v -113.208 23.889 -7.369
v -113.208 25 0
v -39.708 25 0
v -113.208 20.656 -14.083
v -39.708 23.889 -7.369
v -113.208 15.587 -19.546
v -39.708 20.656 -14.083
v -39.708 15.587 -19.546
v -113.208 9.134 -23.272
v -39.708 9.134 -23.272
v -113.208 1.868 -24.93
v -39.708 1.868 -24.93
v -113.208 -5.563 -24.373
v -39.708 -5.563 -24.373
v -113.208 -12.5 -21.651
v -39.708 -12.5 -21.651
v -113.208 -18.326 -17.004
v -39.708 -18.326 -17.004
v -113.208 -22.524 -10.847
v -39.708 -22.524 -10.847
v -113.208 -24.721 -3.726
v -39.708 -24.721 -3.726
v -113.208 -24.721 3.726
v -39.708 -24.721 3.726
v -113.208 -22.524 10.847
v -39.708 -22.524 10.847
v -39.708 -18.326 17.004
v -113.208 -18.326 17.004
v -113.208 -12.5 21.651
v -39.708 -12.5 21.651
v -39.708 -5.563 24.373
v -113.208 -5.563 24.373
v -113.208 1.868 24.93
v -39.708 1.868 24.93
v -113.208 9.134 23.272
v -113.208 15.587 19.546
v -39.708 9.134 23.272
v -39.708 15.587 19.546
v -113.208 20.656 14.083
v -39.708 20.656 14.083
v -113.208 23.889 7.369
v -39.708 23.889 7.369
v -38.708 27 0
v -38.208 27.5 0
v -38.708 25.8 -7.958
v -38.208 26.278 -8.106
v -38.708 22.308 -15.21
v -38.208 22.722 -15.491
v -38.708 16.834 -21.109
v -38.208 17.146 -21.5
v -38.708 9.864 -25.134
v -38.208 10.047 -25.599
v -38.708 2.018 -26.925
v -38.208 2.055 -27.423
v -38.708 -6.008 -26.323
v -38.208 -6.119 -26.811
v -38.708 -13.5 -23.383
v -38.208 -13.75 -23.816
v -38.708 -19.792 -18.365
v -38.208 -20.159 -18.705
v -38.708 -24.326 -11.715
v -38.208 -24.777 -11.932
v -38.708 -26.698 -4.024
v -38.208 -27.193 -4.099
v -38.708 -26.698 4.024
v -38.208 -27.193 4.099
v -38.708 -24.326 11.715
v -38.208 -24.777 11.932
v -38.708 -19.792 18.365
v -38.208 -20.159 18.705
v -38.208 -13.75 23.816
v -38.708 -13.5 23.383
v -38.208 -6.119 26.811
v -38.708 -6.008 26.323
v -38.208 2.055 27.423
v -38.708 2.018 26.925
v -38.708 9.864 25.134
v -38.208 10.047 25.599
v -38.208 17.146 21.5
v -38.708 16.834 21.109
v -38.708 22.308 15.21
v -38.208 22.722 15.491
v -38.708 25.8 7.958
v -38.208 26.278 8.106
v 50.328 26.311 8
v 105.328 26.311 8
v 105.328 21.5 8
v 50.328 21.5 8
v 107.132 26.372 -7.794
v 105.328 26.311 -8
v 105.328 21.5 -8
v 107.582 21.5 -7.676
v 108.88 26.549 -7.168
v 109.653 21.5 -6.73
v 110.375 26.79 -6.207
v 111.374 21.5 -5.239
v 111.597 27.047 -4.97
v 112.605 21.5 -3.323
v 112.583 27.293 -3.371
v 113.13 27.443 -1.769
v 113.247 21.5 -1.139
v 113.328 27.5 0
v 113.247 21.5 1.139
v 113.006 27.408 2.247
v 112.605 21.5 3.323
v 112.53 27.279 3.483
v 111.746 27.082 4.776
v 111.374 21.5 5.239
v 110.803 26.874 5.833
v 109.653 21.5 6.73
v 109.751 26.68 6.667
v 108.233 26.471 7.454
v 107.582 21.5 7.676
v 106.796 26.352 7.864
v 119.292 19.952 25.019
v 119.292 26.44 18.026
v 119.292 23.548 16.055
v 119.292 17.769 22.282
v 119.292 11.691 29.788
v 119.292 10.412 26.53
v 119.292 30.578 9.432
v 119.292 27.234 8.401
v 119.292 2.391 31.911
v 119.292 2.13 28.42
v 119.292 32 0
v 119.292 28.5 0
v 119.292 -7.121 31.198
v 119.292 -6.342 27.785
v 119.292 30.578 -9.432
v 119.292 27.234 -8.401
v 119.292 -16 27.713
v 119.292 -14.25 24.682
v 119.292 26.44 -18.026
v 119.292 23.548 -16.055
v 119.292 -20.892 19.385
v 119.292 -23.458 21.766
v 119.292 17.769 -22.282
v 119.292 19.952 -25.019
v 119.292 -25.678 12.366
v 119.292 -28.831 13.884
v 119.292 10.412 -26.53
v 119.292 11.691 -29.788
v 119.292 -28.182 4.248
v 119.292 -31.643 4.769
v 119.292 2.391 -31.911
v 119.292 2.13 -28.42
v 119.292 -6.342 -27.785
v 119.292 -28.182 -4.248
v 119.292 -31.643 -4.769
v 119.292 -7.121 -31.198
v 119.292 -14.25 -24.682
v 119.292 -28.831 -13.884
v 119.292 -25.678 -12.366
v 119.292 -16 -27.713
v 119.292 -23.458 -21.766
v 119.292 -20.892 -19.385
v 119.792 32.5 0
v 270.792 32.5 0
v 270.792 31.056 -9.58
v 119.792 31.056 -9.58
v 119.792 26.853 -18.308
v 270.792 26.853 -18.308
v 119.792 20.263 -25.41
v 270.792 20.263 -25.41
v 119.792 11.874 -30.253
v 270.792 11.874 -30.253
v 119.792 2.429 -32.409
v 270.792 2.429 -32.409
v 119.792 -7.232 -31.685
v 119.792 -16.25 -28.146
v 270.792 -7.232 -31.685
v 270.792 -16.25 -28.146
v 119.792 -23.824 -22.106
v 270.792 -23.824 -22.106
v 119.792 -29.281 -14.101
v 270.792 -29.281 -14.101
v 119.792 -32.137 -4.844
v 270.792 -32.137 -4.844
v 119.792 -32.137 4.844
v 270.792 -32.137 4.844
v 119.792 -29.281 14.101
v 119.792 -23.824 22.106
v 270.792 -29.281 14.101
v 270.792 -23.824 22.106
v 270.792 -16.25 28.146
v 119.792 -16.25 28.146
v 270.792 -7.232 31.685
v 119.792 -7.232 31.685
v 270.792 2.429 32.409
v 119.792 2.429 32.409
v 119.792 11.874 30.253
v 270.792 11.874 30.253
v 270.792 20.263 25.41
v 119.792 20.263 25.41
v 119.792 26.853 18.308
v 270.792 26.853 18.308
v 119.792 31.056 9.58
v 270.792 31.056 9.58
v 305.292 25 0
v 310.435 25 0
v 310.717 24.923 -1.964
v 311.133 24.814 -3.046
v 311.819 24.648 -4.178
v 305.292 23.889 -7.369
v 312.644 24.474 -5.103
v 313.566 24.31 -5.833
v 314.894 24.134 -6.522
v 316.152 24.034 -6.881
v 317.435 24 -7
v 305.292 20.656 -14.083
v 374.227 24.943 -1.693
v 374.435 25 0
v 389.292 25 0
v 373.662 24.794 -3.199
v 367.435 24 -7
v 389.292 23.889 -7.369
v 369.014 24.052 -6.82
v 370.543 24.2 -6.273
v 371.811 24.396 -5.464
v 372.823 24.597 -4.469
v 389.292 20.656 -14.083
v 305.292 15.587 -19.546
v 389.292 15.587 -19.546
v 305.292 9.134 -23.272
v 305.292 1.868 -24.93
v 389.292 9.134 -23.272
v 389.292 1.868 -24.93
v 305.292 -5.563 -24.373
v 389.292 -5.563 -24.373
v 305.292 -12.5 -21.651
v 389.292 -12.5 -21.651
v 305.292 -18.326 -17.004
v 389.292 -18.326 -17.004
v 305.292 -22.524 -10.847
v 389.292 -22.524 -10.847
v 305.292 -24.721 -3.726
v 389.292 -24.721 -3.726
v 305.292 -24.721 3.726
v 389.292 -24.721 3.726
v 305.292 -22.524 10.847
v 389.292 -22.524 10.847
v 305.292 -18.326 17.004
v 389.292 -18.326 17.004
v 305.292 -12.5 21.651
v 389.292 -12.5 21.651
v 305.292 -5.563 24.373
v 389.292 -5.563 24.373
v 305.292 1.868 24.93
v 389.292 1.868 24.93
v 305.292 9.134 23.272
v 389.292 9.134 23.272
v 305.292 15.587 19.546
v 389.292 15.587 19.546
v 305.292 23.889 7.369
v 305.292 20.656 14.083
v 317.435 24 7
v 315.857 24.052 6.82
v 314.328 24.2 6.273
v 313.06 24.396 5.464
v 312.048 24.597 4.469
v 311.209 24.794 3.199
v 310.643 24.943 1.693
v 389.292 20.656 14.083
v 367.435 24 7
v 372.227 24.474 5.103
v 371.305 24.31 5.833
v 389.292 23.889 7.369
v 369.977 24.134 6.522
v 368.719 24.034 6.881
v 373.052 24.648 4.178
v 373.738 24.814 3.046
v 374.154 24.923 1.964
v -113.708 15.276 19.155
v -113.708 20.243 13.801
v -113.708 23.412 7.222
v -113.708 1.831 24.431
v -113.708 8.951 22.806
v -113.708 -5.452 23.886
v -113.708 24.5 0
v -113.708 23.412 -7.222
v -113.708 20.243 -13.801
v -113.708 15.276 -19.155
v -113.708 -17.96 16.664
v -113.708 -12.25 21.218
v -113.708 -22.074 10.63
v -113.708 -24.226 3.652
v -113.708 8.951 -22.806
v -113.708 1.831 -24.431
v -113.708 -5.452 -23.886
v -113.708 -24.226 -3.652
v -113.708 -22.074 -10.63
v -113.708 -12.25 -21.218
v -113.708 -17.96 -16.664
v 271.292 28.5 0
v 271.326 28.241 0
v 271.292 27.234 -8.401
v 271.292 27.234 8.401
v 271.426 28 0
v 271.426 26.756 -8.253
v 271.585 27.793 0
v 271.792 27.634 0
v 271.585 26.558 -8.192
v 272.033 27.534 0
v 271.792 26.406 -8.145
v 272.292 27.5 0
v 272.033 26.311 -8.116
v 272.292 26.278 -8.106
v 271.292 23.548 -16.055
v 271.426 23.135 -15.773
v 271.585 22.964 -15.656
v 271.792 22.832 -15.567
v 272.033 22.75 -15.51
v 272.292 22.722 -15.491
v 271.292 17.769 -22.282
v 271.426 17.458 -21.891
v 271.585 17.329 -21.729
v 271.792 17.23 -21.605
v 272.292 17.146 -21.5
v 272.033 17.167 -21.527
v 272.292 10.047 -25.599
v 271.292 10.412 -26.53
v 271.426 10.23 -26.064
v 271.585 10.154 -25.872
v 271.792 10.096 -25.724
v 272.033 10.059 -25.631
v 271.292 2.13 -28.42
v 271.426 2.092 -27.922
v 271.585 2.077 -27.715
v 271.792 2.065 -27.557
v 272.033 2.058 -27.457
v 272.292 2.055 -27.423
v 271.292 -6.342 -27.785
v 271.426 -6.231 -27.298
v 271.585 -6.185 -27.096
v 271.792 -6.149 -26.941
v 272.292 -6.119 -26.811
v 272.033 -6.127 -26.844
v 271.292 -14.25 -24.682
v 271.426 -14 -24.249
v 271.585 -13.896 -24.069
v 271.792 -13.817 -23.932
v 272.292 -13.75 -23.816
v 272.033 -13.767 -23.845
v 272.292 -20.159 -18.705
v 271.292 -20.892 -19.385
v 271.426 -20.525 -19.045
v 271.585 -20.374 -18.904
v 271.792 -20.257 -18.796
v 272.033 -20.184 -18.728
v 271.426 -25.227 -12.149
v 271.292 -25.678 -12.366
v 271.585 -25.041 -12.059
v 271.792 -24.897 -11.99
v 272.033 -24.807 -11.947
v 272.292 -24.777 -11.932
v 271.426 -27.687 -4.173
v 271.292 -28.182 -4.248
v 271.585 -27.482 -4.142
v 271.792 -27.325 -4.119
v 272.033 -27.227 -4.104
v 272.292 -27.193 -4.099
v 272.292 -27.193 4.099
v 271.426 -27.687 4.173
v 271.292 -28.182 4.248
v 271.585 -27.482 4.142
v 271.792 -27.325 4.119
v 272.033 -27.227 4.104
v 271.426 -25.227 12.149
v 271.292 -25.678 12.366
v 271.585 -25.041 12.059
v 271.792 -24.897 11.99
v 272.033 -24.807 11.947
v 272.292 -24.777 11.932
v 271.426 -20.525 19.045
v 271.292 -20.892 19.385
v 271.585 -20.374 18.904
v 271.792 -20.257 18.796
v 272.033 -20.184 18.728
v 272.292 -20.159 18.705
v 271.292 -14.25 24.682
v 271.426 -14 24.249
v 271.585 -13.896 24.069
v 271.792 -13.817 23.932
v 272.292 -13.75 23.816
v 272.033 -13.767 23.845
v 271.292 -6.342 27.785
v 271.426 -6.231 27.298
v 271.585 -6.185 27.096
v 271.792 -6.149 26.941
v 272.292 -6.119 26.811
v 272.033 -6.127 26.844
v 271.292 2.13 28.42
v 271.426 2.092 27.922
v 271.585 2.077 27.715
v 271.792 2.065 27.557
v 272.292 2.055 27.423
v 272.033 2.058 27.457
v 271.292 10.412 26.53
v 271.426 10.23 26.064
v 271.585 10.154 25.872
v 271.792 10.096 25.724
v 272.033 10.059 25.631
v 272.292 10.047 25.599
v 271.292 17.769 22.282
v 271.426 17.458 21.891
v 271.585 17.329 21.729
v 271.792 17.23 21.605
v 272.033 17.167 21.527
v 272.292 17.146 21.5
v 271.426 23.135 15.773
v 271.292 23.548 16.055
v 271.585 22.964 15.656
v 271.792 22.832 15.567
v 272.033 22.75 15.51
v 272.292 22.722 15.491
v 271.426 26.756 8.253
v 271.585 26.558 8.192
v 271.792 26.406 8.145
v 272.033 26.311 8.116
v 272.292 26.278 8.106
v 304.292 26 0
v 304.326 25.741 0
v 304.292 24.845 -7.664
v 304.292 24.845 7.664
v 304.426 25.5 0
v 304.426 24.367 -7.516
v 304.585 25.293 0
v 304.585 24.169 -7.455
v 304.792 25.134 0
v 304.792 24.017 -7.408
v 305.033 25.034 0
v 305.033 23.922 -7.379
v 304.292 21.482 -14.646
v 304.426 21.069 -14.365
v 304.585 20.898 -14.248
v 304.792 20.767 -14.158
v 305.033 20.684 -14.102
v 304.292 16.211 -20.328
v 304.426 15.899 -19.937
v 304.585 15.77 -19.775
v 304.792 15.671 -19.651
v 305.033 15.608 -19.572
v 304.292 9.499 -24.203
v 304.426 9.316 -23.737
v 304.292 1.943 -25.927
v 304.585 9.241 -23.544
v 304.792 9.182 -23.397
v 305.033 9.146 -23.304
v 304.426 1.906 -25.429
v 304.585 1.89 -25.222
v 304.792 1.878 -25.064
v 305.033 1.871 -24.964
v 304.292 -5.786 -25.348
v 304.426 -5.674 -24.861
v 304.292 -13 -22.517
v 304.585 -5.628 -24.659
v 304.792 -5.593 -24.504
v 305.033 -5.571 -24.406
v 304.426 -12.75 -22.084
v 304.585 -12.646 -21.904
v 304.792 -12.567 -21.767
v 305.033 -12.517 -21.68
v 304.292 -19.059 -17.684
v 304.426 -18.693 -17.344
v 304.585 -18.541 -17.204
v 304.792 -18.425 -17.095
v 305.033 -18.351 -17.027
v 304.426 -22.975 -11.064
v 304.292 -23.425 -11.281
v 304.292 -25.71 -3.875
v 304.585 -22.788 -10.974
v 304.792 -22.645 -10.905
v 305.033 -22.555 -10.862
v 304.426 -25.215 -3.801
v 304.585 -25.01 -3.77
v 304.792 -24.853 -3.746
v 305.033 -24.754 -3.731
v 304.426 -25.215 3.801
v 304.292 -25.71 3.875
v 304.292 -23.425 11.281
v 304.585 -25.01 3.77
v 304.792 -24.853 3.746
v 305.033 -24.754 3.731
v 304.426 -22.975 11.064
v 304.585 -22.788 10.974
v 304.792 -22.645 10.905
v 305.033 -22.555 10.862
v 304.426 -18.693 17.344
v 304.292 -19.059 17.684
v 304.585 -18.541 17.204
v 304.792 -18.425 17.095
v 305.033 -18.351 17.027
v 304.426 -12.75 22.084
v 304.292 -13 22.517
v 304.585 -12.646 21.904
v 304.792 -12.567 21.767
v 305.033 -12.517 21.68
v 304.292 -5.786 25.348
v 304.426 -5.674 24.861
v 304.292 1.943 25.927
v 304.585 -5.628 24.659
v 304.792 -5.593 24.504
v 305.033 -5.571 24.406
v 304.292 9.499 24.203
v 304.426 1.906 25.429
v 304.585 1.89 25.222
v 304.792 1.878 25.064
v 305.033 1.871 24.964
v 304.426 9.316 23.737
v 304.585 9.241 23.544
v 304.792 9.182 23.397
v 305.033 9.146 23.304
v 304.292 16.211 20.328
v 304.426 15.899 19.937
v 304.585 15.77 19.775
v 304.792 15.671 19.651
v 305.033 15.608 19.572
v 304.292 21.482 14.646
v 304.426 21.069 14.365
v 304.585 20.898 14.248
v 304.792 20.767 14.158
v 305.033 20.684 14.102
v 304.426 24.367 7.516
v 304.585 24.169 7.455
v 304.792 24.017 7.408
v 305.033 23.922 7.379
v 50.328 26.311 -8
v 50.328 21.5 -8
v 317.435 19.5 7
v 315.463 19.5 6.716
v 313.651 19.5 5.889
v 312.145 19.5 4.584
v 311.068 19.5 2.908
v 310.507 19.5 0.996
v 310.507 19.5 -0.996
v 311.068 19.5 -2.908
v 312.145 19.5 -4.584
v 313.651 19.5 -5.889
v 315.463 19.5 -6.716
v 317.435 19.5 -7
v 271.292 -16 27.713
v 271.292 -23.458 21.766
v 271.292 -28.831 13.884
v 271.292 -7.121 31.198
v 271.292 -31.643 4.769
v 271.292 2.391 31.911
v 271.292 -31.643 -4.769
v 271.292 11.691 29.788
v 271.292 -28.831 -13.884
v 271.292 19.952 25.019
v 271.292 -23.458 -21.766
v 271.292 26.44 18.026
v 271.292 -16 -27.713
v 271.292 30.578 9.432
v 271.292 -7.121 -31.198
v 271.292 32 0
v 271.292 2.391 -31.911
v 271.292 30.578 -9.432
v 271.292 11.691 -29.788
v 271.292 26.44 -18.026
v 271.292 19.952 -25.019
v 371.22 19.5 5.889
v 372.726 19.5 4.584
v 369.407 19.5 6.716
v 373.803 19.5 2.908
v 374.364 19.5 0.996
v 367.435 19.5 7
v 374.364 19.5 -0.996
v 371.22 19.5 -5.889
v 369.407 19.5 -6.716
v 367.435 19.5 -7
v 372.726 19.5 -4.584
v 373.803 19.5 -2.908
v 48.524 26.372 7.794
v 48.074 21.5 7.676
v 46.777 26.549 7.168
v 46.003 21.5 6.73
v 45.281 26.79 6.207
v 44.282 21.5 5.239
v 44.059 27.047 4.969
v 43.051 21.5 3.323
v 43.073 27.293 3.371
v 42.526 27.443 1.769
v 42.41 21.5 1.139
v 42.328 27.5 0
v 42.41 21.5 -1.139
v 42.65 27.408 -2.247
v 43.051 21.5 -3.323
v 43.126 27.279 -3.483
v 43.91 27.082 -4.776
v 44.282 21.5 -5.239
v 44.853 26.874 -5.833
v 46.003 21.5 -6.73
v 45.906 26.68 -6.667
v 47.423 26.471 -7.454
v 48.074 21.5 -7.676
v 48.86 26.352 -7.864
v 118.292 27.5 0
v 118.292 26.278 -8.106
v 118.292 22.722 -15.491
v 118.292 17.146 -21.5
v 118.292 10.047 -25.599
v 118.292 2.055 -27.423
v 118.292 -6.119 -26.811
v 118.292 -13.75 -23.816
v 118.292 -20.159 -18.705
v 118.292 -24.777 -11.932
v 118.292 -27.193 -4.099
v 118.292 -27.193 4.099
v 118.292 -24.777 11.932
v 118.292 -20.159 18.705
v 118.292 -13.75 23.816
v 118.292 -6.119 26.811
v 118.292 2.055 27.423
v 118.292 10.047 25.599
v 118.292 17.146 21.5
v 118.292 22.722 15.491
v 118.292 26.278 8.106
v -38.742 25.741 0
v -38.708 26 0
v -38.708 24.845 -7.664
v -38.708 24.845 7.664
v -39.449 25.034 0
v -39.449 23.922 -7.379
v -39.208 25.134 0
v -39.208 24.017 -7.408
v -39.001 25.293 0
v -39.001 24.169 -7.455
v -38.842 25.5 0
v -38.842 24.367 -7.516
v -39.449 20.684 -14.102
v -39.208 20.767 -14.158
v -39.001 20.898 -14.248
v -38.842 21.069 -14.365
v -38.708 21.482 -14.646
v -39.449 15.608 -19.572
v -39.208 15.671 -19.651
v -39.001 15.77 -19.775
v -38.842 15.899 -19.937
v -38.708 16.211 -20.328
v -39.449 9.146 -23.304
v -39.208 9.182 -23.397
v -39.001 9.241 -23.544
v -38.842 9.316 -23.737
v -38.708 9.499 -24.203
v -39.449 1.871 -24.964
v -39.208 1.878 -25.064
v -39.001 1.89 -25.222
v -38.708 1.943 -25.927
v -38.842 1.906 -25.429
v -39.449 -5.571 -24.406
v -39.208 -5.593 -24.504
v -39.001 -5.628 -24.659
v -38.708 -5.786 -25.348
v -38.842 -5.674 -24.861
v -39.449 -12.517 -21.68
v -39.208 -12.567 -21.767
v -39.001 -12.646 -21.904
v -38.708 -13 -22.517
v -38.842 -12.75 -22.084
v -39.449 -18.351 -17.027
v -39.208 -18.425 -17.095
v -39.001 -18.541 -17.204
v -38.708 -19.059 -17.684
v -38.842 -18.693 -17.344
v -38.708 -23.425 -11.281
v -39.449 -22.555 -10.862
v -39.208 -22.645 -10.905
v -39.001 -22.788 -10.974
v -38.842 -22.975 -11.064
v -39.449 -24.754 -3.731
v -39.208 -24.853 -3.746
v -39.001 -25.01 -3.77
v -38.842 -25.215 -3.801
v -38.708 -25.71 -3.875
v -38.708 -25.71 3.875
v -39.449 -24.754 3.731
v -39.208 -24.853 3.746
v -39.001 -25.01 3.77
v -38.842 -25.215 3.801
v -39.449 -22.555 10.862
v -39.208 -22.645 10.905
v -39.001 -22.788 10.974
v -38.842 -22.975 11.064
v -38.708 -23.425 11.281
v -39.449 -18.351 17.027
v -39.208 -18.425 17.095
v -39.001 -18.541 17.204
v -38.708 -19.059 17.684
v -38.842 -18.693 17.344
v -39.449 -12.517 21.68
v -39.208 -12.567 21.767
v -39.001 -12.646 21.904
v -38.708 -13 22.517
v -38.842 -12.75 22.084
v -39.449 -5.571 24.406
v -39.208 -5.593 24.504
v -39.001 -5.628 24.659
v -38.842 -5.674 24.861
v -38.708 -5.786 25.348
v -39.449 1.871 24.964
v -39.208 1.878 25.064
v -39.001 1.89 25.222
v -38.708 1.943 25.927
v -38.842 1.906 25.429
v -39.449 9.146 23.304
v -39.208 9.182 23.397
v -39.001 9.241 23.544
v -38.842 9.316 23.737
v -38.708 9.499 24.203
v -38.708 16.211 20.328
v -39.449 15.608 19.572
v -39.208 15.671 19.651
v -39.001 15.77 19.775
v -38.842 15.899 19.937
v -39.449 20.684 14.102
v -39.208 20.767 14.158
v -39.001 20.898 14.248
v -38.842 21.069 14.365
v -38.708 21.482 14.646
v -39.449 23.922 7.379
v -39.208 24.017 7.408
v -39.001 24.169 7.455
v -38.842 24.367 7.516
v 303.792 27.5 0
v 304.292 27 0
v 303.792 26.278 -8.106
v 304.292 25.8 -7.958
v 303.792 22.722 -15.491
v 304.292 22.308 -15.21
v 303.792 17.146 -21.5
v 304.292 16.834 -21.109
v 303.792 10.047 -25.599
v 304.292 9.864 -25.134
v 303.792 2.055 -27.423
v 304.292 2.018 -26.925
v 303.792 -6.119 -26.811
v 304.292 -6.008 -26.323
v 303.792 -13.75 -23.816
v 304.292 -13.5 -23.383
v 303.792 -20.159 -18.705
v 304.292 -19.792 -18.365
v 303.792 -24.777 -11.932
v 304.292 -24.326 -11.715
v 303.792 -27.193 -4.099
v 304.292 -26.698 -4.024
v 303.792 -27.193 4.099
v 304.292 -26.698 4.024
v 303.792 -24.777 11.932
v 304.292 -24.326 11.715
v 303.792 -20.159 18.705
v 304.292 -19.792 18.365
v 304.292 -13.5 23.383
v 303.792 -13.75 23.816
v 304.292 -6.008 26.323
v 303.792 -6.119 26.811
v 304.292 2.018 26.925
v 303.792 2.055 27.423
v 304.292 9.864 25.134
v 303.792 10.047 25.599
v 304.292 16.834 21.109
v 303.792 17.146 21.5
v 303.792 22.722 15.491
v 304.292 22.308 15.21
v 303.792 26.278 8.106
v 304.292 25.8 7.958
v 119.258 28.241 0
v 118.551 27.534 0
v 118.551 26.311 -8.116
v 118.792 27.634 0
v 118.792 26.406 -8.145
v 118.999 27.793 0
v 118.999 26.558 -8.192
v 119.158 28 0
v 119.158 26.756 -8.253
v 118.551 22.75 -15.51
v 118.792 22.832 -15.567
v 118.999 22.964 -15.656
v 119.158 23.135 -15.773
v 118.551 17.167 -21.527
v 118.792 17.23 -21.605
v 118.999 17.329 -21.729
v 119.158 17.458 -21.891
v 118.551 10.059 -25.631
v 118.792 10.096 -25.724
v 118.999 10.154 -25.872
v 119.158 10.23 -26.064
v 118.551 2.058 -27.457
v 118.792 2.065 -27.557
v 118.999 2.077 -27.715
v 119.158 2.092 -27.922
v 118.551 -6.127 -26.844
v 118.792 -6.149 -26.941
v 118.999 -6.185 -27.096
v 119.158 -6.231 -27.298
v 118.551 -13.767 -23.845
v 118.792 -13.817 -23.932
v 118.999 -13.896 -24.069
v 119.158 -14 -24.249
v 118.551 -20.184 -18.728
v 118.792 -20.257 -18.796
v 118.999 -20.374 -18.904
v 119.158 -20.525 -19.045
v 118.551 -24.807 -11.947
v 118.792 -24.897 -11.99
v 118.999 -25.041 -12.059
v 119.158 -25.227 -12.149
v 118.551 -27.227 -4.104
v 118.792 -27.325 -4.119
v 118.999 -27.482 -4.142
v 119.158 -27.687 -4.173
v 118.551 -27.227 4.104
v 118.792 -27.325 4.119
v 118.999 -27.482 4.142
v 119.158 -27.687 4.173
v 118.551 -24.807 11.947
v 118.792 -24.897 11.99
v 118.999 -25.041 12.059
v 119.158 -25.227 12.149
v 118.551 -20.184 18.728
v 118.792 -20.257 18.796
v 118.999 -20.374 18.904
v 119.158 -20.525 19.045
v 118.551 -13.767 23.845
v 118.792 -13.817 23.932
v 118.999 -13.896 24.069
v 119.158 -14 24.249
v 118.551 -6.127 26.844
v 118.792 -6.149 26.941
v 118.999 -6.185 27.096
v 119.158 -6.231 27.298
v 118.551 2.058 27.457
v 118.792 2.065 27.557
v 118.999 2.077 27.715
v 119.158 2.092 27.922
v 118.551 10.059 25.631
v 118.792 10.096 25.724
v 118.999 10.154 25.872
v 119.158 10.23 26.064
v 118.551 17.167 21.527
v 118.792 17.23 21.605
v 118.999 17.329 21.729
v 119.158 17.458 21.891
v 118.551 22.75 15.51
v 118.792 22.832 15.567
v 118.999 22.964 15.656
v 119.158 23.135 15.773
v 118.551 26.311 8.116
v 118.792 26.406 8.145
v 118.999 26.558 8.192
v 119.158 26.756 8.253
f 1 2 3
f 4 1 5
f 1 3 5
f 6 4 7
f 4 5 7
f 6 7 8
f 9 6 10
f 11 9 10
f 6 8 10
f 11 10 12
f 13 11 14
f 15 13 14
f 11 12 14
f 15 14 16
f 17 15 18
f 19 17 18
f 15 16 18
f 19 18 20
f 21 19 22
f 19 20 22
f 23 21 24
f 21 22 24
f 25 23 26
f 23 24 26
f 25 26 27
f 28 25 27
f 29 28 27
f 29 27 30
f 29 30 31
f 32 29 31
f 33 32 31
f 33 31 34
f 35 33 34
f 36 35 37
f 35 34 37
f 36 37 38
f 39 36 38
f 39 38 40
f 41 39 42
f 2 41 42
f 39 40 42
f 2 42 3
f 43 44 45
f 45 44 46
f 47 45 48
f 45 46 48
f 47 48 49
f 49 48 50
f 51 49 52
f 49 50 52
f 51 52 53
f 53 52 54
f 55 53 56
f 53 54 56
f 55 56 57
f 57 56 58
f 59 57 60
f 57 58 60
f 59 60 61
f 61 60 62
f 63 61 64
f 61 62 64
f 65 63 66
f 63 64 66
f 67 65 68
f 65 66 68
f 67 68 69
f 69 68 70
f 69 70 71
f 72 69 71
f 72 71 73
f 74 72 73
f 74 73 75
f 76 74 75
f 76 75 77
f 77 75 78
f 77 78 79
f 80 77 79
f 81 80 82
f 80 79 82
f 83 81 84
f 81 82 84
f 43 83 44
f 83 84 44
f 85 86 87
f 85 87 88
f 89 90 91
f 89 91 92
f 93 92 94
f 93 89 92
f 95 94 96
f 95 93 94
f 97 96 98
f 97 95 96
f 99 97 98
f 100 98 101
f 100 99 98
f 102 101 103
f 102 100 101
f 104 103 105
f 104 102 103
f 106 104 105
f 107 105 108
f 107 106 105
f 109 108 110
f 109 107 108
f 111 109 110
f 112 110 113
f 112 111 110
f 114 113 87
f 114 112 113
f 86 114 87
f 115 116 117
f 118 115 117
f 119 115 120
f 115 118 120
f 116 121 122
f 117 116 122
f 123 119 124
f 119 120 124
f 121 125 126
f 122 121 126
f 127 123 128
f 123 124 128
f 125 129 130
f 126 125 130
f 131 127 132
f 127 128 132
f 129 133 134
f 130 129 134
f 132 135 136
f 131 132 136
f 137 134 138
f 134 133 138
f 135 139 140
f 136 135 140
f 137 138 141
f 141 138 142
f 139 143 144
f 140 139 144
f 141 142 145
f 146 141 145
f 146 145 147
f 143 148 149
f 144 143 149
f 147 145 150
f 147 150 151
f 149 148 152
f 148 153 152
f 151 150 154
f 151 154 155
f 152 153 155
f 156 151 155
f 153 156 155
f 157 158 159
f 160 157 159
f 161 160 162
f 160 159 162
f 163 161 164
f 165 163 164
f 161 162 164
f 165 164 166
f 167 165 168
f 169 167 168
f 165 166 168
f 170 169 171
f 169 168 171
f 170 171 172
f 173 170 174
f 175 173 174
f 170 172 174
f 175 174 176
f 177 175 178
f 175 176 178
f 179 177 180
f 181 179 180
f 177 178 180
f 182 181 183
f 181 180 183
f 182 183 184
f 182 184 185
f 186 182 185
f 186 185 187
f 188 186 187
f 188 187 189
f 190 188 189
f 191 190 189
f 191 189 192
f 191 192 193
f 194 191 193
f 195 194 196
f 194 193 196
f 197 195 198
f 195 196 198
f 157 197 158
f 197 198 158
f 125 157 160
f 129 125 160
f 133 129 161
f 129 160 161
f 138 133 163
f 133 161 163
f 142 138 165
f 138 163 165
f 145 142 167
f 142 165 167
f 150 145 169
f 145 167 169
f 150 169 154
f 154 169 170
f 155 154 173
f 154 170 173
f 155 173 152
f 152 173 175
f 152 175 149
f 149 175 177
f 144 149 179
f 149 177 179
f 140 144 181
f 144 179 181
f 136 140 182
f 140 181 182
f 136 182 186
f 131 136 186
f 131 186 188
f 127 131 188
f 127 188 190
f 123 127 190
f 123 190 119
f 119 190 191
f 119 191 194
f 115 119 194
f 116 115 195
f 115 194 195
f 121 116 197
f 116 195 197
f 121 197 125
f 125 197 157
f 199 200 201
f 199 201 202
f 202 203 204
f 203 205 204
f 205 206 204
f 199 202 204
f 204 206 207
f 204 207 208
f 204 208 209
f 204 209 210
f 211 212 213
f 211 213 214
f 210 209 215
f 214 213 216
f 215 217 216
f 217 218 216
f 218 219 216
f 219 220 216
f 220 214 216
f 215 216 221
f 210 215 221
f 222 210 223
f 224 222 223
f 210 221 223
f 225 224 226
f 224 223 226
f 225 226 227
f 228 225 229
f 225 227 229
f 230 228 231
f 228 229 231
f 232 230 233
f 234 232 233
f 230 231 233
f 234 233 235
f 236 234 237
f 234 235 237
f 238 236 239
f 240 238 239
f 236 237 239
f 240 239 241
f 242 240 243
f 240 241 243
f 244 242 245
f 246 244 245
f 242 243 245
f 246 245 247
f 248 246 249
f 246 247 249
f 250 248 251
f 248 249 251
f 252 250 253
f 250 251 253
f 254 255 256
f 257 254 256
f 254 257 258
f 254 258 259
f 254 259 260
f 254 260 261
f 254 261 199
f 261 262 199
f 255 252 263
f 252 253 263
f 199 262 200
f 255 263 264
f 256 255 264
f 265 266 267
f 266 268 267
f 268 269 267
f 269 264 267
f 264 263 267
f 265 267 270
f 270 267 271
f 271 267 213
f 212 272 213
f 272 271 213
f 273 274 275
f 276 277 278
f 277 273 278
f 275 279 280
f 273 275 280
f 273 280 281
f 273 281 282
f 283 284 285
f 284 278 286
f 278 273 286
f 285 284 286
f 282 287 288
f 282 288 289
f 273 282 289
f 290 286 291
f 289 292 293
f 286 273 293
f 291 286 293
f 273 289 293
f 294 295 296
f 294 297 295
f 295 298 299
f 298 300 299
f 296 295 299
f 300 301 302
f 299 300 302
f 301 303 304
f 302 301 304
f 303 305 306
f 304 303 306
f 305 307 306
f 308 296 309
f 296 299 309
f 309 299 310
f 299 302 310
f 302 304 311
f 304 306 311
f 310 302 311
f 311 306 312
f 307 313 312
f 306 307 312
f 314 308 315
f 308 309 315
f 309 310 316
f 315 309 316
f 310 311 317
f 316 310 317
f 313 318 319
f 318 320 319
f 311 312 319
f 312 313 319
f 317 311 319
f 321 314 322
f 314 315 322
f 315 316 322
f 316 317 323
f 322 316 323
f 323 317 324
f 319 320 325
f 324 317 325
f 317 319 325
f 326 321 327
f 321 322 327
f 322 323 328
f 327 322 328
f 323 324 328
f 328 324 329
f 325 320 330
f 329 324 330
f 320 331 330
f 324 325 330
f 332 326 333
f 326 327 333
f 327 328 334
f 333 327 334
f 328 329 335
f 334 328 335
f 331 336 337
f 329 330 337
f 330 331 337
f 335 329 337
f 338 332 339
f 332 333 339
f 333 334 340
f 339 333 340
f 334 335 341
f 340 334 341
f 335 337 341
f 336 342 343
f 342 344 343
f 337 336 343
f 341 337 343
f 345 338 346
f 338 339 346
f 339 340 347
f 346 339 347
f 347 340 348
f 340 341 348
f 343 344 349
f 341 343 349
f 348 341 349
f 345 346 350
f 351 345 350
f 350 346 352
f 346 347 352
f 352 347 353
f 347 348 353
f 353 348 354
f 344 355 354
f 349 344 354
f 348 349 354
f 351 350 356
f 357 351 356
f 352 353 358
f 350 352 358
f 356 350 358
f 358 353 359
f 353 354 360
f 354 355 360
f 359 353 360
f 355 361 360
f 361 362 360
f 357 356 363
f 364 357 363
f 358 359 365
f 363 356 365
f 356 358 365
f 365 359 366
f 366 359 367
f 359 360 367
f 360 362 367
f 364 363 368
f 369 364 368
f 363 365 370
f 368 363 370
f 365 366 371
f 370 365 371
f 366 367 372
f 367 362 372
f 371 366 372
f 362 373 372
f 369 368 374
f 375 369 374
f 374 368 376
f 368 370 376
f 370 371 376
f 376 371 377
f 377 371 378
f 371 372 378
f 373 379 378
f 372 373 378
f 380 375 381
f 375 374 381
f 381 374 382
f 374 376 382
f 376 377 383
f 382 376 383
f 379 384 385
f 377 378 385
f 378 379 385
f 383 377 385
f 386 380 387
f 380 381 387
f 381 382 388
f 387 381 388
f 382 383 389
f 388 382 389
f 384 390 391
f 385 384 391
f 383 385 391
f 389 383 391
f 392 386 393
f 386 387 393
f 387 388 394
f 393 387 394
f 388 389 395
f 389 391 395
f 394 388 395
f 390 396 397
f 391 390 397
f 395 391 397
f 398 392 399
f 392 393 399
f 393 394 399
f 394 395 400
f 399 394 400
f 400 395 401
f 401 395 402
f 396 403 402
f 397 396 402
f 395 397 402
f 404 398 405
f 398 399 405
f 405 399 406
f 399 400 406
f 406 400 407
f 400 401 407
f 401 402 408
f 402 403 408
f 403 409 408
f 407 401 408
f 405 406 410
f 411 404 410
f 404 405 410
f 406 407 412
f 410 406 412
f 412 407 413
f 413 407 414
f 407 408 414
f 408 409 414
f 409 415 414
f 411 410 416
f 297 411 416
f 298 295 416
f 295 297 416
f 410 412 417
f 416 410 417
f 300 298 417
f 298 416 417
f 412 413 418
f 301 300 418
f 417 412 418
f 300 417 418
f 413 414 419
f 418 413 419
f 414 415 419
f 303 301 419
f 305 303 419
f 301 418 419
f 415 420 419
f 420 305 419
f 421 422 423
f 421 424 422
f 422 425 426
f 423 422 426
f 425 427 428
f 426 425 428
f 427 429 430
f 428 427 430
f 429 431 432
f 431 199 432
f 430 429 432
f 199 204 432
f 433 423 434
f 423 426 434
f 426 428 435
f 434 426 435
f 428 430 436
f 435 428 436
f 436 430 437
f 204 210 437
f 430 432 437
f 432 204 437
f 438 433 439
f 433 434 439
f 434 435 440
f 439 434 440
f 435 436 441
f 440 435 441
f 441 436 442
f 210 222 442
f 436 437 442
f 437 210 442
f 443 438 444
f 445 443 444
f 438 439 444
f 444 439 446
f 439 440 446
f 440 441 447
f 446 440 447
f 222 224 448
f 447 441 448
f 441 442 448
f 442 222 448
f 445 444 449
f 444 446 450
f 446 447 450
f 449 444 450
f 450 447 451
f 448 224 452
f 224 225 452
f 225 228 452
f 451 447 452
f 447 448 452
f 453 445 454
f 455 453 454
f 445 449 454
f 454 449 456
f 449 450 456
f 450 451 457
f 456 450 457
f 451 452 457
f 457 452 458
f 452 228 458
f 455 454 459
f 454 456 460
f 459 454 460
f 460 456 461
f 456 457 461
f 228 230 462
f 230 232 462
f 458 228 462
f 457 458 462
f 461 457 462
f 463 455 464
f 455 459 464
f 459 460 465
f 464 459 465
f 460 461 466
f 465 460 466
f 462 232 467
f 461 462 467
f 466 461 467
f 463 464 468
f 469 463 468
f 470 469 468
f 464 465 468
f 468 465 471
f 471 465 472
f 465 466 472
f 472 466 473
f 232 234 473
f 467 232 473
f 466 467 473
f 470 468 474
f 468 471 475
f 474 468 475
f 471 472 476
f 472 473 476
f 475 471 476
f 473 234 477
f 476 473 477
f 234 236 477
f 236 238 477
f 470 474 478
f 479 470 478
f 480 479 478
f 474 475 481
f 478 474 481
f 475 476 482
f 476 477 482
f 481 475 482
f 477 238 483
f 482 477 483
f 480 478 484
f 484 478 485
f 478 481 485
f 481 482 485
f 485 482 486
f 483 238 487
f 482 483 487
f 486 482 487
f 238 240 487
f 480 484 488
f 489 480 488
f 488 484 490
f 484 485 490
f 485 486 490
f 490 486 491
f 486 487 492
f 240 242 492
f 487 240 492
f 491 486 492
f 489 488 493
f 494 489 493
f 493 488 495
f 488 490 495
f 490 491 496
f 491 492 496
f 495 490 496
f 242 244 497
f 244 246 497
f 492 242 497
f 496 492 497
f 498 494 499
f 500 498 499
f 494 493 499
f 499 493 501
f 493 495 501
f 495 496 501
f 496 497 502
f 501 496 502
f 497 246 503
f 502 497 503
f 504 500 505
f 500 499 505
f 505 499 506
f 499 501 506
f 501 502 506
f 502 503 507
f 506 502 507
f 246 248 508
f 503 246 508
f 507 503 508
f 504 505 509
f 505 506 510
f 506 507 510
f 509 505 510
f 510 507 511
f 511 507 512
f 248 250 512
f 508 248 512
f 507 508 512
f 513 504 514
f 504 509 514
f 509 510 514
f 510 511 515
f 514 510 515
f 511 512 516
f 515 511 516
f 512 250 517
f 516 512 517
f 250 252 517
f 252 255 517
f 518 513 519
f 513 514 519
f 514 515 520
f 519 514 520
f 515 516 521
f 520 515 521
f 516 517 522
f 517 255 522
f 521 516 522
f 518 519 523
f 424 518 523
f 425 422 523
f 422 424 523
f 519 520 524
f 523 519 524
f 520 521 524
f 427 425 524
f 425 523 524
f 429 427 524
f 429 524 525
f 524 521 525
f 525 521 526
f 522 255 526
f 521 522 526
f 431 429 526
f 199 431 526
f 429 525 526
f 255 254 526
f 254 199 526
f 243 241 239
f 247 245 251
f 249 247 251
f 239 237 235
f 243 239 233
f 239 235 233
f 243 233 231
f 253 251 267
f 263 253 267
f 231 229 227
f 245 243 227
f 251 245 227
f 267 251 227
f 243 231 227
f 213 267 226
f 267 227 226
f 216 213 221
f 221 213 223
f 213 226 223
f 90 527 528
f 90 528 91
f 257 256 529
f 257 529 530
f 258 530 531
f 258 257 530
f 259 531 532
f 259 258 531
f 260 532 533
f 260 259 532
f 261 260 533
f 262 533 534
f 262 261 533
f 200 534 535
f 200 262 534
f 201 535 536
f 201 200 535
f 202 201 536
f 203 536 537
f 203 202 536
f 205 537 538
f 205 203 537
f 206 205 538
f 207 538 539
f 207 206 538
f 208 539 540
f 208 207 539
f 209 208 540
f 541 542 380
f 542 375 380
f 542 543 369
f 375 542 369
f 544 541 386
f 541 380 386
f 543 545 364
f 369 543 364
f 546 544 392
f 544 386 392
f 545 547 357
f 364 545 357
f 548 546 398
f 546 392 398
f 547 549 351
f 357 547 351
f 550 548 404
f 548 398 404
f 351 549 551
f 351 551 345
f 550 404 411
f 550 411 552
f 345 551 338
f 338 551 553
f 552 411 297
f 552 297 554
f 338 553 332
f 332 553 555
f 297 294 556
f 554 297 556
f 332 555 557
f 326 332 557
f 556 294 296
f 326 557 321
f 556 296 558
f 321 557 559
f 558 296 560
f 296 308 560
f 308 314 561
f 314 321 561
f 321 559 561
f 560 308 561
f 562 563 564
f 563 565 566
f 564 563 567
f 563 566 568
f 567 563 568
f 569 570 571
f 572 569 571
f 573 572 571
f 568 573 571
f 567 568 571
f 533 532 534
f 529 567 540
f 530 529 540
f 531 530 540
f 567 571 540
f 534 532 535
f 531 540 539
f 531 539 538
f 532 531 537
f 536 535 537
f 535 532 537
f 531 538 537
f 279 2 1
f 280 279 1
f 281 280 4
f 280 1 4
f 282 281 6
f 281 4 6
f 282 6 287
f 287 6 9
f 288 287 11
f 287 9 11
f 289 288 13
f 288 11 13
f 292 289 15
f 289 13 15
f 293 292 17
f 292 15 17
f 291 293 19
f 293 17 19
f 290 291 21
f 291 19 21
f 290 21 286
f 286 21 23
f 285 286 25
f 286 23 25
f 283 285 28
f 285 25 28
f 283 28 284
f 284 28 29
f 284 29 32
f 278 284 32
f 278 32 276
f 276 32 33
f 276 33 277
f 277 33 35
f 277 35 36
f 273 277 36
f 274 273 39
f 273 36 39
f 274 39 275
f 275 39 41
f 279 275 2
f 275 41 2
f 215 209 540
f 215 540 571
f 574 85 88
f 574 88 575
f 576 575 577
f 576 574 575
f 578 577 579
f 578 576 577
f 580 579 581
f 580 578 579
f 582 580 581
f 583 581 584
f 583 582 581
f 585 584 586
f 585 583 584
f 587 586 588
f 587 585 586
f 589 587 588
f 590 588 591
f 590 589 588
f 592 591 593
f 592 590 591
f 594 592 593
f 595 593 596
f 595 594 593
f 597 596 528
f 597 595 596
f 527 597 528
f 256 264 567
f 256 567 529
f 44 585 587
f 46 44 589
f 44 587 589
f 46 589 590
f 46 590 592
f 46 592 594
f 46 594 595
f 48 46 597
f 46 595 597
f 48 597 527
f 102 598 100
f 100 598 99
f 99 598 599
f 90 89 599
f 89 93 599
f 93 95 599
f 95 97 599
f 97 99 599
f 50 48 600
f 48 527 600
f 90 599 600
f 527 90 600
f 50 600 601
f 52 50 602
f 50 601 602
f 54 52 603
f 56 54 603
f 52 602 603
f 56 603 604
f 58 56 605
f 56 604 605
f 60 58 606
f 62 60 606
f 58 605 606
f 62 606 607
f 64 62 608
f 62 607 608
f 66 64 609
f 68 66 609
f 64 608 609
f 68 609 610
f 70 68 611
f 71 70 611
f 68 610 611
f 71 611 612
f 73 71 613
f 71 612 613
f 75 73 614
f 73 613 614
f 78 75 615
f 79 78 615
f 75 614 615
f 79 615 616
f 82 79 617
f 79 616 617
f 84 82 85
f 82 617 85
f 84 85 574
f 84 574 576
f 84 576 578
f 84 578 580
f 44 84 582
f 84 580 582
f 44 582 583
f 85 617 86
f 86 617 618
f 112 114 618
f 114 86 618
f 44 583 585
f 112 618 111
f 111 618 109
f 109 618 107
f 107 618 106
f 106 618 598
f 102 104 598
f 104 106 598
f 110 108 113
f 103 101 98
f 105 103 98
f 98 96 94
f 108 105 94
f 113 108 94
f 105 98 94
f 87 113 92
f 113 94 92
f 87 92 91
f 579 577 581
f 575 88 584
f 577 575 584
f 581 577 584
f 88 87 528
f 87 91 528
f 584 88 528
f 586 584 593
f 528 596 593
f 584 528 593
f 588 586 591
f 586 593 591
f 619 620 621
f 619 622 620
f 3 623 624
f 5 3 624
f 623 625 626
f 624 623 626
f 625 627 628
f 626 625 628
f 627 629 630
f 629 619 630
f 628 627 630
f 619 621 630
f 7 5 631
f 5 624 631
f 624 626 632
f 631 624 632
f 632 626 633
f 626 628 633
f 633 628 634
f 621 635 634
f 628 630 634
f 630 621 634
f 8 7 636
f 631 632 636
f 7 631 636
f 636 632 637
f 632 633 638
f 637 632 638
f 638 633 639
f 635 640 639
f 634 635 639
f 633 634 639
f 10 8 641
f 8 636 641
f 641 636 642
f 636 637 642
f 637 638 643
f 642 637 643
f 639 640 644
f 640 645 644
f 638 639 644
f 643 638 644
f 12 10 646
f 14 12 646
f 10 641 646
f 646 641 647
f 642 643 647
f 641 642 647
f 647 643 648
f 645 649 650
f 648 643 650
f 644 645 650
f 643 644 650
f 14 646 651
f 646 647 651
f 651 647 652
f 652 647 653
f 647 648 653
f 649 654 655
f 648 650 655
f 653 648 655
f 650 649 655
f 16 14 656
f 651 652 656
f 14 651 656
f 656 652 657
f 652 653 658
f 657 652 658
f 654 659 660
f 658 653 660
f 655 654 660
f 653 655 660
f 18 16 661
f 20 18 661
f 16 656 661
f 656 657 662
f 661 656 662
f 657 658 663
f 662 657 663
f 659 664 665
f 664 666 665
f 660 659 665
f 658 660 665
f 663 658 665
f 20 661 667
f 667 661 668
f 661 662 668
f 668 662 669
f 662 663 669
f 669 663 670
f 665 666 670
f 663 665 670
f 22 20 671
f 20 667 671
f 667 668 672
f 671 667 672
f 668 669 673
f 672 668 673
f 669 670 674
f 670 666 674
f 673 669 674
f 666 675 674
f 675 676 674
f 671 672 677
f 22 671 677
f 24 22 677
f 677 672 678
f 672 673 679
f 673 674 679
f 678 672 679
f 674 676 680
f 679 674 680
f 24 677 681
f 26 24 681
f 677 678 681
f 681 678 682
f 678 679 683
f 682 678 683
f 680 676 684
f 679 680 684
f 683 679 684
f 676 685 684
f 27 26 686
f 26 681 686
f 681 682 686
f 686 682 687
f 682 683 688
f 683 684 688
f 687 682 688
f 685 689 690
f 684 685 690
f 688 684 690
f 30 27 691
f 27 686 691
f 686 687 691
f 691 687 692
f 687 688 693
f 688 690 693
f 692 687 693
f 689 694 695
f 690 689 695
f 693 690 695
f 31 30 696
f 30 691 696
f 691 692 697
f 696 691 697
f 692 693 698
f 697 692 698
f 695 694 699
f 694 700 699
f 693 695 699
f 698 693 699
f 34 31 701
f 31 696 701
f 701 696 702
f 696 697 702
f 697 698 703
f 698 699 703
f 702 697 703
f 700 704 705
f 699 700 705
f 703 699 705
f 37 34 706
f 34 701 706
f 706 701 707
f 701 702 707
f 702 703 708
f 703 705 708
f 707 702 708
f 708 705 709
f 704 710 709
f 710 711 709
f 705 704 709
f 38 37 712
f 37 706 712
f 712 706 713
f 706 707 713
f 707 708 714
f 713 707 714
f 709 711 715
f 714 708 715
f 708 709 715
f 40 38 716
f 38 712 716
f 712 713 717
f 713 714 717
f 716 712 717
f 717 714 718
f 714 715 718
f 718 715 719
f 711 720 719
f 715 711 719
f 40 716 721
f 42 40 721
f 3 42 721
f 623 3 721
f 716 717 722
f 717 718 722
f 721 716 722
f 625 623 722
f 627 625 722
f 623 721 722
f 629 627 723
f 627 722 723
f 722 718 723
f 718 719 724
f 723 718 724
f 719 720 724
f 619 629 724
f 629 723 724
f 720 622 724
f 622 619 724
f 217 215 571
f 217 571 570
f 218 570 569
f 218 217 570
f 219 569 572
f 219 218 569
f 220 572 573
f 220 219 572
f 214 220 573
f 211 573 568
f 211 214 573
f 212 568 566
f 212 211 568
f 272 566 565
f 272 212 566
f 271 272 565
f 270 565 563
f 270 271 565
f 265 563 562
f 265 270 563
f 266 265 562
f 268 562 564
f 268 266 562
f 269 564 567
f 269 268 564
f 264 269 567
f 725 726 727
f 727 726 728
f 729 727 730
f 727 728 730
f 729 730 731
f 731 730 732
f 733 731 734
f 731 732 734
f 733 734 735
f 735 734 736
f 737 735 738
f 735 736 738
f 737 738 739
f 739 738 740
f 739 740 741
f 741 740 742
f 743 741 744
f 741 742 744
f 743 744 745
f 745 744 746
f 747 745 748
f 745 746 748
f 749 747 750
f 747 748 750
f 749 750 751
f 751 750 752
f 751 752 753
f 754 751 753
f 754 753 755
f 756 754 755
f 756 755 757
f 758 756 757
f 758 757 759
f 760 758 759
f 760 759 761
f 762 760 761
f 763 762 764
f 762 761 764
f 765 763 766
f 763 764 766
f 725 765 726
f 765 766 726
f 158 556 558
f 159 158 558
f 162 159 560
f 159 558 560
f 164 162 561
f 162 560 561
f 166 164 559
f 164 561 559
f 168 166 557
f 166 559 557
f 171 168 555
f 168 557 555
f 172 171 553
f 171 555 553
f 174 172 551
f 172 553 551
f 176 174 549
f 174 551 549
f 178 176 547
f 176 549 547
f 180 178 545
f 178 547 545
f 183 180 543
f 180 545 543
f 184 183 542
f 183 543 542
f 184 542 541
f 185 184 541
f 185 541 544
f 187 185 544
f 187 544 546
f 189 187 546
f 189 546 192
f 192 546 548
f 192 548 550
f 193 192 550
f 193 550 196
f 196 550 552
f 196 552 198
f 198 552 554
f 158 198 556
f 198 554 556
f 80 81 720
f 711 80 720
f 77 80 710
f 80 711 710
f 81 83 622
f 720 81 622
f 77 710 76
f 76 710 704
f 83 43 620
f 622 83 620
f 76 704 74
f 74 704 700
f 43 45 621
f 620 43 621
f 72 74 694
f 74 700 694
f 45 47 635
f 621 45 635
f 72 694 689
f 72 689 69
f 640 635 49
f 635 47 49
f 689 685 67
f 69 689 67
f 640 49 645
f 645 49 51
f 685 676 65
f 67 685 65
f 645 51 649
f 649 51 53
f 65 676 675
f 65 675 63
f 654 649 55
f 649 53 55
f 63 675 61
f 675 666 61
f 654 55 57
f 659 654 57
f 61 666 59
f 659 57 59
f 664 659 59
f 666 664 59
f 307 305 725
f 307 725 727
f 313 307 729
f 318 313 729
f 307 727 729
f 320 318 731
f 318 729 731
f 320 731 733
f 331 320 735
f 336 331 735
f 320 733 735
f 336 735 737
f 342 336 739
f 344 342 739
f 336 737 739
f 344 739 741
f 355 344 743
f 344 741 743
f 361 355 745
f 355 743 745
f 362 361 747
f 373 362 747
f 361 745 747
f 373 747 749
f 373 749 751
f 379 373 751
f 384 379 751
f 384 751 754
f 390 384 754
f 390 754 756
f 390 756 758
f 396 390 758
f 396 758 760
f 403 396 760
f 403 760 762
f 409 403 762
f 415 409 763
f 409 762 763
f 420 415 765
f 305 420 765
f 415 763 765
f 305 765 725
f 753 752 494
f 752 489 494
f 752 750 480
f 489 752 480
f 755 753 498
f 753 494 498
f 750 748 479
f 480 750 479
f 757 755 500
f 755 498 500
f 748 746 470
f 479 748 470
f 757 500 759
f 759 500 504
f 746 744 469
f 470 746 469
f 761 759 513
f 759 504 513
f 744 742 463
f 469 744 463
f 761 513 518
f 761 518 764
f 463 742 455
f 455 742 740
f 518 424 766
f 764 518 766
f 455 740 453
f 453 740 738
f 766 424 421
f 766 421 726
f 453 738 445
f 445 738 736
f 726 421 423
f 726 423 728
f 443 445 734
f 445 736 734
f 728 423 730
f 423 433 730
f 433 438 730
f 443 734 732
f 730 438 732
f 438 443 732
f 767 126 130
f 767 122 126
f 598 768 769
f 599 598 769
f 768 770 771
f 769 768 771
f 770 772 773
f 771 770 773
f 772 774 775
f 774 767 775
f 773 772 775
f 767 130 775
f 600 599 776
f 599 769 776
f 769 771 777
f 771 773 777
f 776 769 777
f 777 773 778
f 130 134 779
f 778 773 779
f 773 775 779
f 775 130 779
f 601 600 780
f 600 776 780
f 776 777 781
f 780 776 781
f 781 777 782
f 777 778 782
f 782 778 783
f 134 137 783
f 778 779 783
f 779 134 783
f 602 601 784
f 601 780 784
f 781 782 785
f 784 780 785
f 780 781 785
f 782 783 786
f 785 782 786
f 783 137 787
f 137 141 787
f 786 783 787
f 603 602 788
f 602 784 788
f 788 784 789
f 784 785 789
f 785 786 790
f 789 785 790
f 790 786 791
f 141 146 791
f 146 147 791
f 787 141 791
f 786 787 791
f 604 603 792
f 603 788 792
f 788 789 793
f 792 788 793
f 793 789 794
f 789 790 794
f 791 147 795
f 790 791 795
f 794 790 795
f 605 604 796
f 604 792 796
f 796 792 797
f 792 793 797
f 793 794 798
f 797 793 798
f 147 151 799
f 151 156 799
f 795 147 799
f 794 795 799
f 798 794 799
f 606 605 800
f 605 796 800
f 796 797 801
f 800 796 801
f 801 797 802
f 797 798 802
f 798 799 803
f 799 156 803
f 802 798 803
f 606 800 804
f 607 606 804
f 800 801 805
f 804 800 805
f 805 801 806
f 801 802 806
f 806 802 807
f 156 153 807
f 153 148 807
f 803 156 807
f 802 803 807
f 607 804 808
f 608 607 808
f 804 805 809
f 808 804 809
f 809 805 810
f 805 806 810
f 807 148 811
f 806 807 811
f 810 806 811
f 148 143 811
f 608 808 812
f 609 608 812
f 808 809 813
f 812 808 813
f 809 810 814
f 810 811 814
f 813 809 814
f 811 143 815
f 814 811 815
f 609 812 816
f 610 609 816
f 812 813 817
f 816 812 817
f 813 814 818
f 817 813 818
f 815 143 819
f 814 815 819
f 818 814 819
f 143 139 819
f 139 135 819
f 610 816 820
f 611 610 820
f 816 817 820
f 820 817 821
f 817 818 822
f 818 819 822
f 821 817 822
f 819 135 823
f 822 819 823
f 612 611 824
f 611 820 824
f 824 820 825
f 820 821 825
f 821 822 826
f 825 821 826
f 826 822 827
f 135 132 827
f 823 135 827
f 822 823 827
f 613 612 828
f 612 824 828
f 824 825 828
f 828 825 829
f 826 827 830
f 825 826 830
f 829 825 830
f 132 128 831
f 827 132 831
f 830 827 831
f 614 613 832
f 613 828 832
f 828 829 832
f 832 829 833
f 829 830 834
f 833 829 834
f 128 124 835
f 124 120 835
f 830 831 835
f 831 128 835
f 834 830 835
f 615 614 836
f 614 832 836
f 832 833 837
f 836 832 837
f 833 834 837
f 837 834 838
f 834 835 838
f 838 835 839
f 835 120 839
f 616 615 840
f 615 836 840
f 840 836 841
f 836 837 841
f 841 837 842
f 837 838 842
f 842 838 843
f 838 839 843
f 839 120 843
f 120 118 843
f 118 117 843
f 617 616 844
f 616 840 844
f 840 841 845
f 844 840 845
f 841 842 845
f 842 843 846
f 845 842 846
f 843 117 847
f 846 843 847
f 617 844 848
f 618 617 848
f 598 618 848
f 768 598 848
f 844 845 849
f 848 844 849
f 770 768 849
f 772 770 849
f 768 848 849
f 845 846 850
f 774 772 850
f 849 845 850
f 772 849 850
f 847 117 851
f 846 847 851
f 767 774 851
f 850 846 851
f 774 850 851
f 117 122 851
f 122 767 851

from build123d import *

# Parameters (mm, degrees)
CHAMFER1_SIZE      = 0.5
FILLET1_R          = 1
CUT_EXTRUDE1_DEPTH = 6
CUT_EXTRUDE2_DEPTH = 5.5


with BuildPart() as part:
    # Sketch1 → Revolve1 (revolve)
    with BuildSketch(Plane.XY):
        Polygon((-113.708057171, 0), (-113.708057171, 25), (-38.708057171, 25), (-38.708057171, 27.5), (119.291942829, 27.5), (119.291942829, 32.5), (271.291942829, 32.5), (271.291942829, 27.5), (304.291942829, 27.5), (304.291942829, 25), (389.291942829, 25), (389.291942829, 0), (178.819444444, 0), align=None)
    revolve(axis=Axis((178.819444444, 0, 0), (-1, 0, 0)))

    # Chamfer1
    chamfer1_edges = [part.edges().sort_by_distance(p)[0] for p in [
        (304.291942829, -27.5, 0),
        (271.291942829, -32.5, 0),
        (119.291942829, -32.5, 0),
        (-38.708057171, -27.5, 0),
        (-113.708057171, -25, 0),
    ]]
    chamfer(chamfer1_edges, length=CHAMFER1_SIZE)

    # Fillet1
    fillet1_edges = [part.edges().sort_by_distance(p)[0] for p in [
        (304.291942829, -25, 0),
        (271.291942829, -27.5, 0),
        (119.291942829, -27.5, 0),
        (-38.708057171, -25, 0),
    ]]
    fillet(fillet1_edges, radius=FILLET1_R)

    # Sketch3 → Cut-Extrude1 (cut)
    with BuildSketch(Plane(origin=(0, 27.5, 0), x_dir=(1, 0, 0), z_dir=(0, 1, 0))):
        with BuildLine():
            Line((50.328098338, 8), (105.328098338, 8))
            ThreePointArc((105.328098338, 8), (113.328098338, 0), (105.328098338, -8))
            Line((105.328098338, -8), (50.328098338, -8))
            ThreePointArc((50.328098338, -8), (42.328098338, 0), (50.328098338, 8))
        make_face()
    extrude(amount=-CUT_EXTRUDE1_DEPTH, mode=Mode.SUBTRACT)

    # Sketch4 → Cut-Extrude2 (cut)
    with BuildSketch(Plane(origin=(0, 25, 0), x_dir=(1, 0, 0), z_dir=(0, 1, 0))):
        with BuildLine():
            Line((317.435334748, 7), (367.435334748, 7))
            ThreePointArc((367.435334748, 7), (374.435334748, 0), (367.435334748, -7))
            Line((367.435334748, -7), (317.435334748, -7))
            ThreePointArc((317.435334748, -7), (310.435334748, 0), (317.435334748, 7))
        make_face()
    extrude(amount=-CUT_EXTRUDE2_DEPTH, mode=Mode.SUBTRACT)


solid = part.part
